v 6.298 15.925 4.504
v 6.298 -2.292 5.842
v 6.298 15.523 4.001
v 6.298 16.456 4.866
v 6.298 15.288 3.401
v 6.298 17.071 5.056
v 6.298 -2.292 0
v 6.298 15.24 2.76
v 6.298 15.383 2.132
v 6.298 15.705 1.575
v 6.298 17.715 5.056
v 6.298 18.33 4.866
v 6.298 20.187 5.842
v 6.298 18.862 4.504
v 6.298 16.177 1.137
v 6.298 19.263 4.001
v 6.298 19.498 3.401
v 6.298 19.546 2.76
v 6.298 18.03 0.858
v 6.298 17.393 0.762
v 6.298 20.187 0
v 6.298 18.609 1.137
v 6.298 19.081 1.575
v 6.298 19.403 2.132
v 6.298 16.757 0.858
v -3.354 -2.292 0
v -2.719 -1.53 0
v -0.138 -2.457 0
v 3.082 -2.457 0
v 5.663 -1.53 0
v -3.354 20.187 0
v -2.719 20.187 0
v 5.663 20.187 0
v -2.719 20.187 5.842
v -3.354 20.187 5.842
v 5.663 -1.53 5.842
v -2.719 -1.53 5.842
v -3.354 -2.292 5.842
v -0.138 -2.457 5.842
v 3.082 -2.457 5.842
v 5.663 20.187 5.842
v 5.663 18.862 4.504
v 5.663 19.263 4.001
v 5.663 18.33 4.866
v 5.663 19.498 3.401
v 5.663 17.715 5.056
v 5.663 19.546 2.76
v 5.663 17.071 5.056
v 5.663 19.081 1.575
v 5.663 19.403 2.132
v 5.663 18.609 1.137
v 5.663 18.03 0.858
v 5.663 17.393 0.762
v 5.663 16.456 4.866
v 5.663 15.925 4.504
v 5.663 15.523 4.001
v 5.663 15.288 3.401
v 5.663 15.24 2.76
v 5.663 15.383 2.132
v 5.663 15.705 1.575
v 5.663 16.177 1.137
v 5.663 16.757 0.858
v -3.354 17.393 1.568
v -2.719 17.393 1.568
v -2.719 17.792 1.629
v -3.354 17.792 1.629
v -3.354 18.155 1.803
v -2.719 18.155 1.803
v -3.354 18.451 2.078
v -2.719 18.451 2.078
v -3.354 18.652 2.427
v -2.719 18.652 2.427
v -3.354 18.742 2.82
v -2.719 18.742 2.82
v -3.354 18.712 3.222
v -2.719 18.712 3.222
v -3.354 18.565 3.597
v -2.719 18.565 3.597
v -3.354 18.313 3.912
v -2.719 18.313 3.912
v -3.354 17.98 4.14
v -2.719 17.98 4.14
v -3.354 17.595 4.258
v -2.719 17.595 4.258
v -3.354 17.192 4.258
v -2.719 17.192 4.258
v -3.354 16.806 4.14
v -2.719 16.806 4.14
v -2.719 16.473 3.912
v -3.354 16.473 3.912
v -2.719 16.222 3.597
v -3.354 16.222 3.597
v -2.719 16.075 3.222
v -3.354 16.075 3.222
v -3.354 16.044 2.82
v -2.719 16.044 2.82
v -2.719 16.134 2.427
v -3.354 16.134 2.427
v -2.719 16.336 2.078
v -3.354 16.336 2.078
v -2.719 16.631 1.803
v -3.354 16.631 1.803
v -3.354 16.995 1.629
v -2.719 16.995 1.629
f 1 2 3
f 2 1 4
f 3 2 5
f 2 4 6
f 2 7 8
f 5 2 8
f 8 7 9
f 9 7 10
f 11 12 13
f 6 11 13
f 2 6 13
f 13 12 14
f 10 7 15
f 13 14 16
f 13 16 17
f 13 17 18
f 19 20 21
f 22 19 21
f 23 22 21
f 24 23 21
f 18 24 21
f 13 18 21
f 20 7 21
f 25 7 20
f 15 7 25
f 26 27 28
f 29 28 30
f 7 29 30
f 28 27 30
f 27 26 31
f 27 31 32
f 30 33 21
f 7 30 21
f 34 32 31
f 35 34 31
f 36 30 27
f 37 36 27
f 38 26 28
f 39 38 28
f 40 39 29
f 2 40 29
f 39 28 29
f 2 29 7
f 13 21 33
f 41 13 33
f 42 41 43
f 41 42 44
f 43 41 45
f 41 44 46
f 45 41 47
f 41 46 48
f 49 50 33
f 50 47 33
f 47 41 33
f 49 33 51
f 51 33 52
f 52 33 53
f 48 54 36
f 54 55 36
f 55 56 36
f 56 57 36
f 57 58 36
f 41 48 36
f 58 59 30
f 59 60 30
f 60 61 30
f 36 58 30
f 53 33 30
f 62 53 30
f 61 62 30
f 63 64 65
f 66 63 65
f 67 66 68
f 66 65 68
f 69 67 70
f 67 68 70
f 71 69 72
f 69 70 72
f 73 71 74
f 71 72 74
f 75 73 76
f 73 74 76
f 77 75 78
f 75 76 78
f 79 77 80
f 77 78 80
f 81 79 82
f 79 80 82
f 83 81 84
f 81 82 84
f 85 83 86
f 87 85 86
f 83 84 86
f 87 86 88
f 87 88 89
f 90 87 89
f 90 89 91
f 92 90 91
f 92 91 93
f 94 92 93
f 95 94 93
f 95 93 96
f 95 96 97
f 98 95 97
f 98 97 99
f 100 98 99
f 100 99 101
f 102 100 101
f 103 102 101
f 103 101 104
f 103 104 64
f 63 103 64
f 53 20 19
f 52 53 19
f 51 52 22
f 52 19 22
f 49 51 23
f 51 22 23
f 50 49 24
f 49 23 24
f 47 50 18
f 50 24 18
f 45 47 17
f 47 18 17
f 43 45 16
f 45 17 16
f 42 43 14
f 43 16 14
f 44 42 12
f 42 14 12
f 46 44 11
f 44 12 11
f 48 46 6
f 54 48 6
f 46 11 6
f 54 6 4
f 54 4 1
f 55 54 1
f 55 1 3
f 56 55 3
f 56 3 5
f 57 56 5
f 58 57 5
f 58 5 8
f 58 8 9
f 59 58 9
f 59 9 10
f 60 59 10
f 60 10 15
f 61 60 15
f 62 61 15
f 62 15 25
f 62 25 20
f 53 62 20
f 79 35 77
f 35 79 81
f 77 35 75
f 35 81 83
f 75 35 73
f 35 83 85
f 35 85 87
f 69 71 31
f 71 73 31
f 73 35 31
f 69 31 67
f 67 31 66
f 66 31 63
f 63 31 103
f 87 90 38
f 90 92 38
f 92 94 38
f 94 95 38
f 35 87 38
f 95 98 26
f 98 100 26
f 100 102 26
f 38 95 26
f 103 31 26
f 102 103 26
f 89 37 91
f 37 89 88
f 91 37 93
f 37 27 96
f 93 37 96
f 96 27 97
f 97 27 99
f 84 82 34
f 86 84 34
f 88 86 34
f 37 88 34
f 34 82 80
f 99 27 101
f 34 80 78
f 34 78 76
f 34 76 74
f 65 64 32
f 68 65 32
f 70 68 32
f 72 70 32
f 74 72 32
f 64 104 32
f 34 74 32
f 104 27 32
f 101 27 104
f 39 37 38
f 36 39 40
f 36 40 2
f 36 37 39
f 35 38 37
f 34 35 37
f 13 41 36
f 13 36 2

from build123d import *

# Parameters (mm, degrees)
BOSS_EXTRUDE1_DEPTH       = 5.842
F_6_32_TAPPED_HOLE1_D     = 2.7051
F_6_32_TAPPED_HOLE1_DEPTH = 0.635
CUT_EXTRUDE1_REACH        = 11.652
SKETCH6_R                 = 2.159
BOSS_EXTRUDE2_DEPTH       = 5.842


with BuildPart() as part:
    # Sketch1 → Boss-Extrude1 (new body)
    with BuildSketch(Plane.XY):
        Polygon((-3.353873239, 20.18718662), (-3.353873239, -2.29181338), (6.298126761, -2.29181338), (6.298126761, 20.18718662), (5.663126761, 20.18718662), (5.663126761, -1.52981338), (-2.718873239, -1.52981338), (-2.718873239, 20.18718662), align=None)
    extrude(amount=BOSS_EXTRUDE1_DEPTH)

    # #6-32 Tapped Hole1
    with Locations(Plane.ZY.offset(3.353873239)):
        with Locations((2.921, 17.39318662)):
            Hole(F_6_32_TAPPED_HOLE1_D / 2, depth=F_6_32_TAPPED_HOLE1_DEPTH)

    # Sketch6 → Cut-Extrude1 (cut, up to next)
    with BuildSketch(Plane(origin=(6.298126761, 0, 0), x_dir=(0, 0, -1), z_dir=(1, 0, 0)), mode=Mode.PRIVATE) as cut_extrude1_sk1:
        with Locations((-2.921, 17.39318662)):
            Circle(SKETCH6_R)
    cut_extrude1_tool1 = extrude(cut_extrude1_sk1.sketch, amount=-CUT_EXTRUDE1_REACH, mode=Mode.PRIVATE) & part.part
    add(cut_extrude1_tool1.solids().sort_by_distance((6.298127, 17.393187, 2.921))[0], mode=Mode.SUBTRACT)

    # Sketch15 → Boss-Extrude2 (add, through all)
    with BuildSketch(Plane.XY):
        with BuildLine():
            Line((6.298126761, -2.29181338), (-3.353873239, -2.29181338))
            ThreePointArc((-3.353873239, -2.29181338), (1.472126761, -2.477704159), (6.298126761, -2.29181338))
        make_face()
    extrude(amount=BOSS_EXTRUDE2_DEPTH)


solid = part.part
